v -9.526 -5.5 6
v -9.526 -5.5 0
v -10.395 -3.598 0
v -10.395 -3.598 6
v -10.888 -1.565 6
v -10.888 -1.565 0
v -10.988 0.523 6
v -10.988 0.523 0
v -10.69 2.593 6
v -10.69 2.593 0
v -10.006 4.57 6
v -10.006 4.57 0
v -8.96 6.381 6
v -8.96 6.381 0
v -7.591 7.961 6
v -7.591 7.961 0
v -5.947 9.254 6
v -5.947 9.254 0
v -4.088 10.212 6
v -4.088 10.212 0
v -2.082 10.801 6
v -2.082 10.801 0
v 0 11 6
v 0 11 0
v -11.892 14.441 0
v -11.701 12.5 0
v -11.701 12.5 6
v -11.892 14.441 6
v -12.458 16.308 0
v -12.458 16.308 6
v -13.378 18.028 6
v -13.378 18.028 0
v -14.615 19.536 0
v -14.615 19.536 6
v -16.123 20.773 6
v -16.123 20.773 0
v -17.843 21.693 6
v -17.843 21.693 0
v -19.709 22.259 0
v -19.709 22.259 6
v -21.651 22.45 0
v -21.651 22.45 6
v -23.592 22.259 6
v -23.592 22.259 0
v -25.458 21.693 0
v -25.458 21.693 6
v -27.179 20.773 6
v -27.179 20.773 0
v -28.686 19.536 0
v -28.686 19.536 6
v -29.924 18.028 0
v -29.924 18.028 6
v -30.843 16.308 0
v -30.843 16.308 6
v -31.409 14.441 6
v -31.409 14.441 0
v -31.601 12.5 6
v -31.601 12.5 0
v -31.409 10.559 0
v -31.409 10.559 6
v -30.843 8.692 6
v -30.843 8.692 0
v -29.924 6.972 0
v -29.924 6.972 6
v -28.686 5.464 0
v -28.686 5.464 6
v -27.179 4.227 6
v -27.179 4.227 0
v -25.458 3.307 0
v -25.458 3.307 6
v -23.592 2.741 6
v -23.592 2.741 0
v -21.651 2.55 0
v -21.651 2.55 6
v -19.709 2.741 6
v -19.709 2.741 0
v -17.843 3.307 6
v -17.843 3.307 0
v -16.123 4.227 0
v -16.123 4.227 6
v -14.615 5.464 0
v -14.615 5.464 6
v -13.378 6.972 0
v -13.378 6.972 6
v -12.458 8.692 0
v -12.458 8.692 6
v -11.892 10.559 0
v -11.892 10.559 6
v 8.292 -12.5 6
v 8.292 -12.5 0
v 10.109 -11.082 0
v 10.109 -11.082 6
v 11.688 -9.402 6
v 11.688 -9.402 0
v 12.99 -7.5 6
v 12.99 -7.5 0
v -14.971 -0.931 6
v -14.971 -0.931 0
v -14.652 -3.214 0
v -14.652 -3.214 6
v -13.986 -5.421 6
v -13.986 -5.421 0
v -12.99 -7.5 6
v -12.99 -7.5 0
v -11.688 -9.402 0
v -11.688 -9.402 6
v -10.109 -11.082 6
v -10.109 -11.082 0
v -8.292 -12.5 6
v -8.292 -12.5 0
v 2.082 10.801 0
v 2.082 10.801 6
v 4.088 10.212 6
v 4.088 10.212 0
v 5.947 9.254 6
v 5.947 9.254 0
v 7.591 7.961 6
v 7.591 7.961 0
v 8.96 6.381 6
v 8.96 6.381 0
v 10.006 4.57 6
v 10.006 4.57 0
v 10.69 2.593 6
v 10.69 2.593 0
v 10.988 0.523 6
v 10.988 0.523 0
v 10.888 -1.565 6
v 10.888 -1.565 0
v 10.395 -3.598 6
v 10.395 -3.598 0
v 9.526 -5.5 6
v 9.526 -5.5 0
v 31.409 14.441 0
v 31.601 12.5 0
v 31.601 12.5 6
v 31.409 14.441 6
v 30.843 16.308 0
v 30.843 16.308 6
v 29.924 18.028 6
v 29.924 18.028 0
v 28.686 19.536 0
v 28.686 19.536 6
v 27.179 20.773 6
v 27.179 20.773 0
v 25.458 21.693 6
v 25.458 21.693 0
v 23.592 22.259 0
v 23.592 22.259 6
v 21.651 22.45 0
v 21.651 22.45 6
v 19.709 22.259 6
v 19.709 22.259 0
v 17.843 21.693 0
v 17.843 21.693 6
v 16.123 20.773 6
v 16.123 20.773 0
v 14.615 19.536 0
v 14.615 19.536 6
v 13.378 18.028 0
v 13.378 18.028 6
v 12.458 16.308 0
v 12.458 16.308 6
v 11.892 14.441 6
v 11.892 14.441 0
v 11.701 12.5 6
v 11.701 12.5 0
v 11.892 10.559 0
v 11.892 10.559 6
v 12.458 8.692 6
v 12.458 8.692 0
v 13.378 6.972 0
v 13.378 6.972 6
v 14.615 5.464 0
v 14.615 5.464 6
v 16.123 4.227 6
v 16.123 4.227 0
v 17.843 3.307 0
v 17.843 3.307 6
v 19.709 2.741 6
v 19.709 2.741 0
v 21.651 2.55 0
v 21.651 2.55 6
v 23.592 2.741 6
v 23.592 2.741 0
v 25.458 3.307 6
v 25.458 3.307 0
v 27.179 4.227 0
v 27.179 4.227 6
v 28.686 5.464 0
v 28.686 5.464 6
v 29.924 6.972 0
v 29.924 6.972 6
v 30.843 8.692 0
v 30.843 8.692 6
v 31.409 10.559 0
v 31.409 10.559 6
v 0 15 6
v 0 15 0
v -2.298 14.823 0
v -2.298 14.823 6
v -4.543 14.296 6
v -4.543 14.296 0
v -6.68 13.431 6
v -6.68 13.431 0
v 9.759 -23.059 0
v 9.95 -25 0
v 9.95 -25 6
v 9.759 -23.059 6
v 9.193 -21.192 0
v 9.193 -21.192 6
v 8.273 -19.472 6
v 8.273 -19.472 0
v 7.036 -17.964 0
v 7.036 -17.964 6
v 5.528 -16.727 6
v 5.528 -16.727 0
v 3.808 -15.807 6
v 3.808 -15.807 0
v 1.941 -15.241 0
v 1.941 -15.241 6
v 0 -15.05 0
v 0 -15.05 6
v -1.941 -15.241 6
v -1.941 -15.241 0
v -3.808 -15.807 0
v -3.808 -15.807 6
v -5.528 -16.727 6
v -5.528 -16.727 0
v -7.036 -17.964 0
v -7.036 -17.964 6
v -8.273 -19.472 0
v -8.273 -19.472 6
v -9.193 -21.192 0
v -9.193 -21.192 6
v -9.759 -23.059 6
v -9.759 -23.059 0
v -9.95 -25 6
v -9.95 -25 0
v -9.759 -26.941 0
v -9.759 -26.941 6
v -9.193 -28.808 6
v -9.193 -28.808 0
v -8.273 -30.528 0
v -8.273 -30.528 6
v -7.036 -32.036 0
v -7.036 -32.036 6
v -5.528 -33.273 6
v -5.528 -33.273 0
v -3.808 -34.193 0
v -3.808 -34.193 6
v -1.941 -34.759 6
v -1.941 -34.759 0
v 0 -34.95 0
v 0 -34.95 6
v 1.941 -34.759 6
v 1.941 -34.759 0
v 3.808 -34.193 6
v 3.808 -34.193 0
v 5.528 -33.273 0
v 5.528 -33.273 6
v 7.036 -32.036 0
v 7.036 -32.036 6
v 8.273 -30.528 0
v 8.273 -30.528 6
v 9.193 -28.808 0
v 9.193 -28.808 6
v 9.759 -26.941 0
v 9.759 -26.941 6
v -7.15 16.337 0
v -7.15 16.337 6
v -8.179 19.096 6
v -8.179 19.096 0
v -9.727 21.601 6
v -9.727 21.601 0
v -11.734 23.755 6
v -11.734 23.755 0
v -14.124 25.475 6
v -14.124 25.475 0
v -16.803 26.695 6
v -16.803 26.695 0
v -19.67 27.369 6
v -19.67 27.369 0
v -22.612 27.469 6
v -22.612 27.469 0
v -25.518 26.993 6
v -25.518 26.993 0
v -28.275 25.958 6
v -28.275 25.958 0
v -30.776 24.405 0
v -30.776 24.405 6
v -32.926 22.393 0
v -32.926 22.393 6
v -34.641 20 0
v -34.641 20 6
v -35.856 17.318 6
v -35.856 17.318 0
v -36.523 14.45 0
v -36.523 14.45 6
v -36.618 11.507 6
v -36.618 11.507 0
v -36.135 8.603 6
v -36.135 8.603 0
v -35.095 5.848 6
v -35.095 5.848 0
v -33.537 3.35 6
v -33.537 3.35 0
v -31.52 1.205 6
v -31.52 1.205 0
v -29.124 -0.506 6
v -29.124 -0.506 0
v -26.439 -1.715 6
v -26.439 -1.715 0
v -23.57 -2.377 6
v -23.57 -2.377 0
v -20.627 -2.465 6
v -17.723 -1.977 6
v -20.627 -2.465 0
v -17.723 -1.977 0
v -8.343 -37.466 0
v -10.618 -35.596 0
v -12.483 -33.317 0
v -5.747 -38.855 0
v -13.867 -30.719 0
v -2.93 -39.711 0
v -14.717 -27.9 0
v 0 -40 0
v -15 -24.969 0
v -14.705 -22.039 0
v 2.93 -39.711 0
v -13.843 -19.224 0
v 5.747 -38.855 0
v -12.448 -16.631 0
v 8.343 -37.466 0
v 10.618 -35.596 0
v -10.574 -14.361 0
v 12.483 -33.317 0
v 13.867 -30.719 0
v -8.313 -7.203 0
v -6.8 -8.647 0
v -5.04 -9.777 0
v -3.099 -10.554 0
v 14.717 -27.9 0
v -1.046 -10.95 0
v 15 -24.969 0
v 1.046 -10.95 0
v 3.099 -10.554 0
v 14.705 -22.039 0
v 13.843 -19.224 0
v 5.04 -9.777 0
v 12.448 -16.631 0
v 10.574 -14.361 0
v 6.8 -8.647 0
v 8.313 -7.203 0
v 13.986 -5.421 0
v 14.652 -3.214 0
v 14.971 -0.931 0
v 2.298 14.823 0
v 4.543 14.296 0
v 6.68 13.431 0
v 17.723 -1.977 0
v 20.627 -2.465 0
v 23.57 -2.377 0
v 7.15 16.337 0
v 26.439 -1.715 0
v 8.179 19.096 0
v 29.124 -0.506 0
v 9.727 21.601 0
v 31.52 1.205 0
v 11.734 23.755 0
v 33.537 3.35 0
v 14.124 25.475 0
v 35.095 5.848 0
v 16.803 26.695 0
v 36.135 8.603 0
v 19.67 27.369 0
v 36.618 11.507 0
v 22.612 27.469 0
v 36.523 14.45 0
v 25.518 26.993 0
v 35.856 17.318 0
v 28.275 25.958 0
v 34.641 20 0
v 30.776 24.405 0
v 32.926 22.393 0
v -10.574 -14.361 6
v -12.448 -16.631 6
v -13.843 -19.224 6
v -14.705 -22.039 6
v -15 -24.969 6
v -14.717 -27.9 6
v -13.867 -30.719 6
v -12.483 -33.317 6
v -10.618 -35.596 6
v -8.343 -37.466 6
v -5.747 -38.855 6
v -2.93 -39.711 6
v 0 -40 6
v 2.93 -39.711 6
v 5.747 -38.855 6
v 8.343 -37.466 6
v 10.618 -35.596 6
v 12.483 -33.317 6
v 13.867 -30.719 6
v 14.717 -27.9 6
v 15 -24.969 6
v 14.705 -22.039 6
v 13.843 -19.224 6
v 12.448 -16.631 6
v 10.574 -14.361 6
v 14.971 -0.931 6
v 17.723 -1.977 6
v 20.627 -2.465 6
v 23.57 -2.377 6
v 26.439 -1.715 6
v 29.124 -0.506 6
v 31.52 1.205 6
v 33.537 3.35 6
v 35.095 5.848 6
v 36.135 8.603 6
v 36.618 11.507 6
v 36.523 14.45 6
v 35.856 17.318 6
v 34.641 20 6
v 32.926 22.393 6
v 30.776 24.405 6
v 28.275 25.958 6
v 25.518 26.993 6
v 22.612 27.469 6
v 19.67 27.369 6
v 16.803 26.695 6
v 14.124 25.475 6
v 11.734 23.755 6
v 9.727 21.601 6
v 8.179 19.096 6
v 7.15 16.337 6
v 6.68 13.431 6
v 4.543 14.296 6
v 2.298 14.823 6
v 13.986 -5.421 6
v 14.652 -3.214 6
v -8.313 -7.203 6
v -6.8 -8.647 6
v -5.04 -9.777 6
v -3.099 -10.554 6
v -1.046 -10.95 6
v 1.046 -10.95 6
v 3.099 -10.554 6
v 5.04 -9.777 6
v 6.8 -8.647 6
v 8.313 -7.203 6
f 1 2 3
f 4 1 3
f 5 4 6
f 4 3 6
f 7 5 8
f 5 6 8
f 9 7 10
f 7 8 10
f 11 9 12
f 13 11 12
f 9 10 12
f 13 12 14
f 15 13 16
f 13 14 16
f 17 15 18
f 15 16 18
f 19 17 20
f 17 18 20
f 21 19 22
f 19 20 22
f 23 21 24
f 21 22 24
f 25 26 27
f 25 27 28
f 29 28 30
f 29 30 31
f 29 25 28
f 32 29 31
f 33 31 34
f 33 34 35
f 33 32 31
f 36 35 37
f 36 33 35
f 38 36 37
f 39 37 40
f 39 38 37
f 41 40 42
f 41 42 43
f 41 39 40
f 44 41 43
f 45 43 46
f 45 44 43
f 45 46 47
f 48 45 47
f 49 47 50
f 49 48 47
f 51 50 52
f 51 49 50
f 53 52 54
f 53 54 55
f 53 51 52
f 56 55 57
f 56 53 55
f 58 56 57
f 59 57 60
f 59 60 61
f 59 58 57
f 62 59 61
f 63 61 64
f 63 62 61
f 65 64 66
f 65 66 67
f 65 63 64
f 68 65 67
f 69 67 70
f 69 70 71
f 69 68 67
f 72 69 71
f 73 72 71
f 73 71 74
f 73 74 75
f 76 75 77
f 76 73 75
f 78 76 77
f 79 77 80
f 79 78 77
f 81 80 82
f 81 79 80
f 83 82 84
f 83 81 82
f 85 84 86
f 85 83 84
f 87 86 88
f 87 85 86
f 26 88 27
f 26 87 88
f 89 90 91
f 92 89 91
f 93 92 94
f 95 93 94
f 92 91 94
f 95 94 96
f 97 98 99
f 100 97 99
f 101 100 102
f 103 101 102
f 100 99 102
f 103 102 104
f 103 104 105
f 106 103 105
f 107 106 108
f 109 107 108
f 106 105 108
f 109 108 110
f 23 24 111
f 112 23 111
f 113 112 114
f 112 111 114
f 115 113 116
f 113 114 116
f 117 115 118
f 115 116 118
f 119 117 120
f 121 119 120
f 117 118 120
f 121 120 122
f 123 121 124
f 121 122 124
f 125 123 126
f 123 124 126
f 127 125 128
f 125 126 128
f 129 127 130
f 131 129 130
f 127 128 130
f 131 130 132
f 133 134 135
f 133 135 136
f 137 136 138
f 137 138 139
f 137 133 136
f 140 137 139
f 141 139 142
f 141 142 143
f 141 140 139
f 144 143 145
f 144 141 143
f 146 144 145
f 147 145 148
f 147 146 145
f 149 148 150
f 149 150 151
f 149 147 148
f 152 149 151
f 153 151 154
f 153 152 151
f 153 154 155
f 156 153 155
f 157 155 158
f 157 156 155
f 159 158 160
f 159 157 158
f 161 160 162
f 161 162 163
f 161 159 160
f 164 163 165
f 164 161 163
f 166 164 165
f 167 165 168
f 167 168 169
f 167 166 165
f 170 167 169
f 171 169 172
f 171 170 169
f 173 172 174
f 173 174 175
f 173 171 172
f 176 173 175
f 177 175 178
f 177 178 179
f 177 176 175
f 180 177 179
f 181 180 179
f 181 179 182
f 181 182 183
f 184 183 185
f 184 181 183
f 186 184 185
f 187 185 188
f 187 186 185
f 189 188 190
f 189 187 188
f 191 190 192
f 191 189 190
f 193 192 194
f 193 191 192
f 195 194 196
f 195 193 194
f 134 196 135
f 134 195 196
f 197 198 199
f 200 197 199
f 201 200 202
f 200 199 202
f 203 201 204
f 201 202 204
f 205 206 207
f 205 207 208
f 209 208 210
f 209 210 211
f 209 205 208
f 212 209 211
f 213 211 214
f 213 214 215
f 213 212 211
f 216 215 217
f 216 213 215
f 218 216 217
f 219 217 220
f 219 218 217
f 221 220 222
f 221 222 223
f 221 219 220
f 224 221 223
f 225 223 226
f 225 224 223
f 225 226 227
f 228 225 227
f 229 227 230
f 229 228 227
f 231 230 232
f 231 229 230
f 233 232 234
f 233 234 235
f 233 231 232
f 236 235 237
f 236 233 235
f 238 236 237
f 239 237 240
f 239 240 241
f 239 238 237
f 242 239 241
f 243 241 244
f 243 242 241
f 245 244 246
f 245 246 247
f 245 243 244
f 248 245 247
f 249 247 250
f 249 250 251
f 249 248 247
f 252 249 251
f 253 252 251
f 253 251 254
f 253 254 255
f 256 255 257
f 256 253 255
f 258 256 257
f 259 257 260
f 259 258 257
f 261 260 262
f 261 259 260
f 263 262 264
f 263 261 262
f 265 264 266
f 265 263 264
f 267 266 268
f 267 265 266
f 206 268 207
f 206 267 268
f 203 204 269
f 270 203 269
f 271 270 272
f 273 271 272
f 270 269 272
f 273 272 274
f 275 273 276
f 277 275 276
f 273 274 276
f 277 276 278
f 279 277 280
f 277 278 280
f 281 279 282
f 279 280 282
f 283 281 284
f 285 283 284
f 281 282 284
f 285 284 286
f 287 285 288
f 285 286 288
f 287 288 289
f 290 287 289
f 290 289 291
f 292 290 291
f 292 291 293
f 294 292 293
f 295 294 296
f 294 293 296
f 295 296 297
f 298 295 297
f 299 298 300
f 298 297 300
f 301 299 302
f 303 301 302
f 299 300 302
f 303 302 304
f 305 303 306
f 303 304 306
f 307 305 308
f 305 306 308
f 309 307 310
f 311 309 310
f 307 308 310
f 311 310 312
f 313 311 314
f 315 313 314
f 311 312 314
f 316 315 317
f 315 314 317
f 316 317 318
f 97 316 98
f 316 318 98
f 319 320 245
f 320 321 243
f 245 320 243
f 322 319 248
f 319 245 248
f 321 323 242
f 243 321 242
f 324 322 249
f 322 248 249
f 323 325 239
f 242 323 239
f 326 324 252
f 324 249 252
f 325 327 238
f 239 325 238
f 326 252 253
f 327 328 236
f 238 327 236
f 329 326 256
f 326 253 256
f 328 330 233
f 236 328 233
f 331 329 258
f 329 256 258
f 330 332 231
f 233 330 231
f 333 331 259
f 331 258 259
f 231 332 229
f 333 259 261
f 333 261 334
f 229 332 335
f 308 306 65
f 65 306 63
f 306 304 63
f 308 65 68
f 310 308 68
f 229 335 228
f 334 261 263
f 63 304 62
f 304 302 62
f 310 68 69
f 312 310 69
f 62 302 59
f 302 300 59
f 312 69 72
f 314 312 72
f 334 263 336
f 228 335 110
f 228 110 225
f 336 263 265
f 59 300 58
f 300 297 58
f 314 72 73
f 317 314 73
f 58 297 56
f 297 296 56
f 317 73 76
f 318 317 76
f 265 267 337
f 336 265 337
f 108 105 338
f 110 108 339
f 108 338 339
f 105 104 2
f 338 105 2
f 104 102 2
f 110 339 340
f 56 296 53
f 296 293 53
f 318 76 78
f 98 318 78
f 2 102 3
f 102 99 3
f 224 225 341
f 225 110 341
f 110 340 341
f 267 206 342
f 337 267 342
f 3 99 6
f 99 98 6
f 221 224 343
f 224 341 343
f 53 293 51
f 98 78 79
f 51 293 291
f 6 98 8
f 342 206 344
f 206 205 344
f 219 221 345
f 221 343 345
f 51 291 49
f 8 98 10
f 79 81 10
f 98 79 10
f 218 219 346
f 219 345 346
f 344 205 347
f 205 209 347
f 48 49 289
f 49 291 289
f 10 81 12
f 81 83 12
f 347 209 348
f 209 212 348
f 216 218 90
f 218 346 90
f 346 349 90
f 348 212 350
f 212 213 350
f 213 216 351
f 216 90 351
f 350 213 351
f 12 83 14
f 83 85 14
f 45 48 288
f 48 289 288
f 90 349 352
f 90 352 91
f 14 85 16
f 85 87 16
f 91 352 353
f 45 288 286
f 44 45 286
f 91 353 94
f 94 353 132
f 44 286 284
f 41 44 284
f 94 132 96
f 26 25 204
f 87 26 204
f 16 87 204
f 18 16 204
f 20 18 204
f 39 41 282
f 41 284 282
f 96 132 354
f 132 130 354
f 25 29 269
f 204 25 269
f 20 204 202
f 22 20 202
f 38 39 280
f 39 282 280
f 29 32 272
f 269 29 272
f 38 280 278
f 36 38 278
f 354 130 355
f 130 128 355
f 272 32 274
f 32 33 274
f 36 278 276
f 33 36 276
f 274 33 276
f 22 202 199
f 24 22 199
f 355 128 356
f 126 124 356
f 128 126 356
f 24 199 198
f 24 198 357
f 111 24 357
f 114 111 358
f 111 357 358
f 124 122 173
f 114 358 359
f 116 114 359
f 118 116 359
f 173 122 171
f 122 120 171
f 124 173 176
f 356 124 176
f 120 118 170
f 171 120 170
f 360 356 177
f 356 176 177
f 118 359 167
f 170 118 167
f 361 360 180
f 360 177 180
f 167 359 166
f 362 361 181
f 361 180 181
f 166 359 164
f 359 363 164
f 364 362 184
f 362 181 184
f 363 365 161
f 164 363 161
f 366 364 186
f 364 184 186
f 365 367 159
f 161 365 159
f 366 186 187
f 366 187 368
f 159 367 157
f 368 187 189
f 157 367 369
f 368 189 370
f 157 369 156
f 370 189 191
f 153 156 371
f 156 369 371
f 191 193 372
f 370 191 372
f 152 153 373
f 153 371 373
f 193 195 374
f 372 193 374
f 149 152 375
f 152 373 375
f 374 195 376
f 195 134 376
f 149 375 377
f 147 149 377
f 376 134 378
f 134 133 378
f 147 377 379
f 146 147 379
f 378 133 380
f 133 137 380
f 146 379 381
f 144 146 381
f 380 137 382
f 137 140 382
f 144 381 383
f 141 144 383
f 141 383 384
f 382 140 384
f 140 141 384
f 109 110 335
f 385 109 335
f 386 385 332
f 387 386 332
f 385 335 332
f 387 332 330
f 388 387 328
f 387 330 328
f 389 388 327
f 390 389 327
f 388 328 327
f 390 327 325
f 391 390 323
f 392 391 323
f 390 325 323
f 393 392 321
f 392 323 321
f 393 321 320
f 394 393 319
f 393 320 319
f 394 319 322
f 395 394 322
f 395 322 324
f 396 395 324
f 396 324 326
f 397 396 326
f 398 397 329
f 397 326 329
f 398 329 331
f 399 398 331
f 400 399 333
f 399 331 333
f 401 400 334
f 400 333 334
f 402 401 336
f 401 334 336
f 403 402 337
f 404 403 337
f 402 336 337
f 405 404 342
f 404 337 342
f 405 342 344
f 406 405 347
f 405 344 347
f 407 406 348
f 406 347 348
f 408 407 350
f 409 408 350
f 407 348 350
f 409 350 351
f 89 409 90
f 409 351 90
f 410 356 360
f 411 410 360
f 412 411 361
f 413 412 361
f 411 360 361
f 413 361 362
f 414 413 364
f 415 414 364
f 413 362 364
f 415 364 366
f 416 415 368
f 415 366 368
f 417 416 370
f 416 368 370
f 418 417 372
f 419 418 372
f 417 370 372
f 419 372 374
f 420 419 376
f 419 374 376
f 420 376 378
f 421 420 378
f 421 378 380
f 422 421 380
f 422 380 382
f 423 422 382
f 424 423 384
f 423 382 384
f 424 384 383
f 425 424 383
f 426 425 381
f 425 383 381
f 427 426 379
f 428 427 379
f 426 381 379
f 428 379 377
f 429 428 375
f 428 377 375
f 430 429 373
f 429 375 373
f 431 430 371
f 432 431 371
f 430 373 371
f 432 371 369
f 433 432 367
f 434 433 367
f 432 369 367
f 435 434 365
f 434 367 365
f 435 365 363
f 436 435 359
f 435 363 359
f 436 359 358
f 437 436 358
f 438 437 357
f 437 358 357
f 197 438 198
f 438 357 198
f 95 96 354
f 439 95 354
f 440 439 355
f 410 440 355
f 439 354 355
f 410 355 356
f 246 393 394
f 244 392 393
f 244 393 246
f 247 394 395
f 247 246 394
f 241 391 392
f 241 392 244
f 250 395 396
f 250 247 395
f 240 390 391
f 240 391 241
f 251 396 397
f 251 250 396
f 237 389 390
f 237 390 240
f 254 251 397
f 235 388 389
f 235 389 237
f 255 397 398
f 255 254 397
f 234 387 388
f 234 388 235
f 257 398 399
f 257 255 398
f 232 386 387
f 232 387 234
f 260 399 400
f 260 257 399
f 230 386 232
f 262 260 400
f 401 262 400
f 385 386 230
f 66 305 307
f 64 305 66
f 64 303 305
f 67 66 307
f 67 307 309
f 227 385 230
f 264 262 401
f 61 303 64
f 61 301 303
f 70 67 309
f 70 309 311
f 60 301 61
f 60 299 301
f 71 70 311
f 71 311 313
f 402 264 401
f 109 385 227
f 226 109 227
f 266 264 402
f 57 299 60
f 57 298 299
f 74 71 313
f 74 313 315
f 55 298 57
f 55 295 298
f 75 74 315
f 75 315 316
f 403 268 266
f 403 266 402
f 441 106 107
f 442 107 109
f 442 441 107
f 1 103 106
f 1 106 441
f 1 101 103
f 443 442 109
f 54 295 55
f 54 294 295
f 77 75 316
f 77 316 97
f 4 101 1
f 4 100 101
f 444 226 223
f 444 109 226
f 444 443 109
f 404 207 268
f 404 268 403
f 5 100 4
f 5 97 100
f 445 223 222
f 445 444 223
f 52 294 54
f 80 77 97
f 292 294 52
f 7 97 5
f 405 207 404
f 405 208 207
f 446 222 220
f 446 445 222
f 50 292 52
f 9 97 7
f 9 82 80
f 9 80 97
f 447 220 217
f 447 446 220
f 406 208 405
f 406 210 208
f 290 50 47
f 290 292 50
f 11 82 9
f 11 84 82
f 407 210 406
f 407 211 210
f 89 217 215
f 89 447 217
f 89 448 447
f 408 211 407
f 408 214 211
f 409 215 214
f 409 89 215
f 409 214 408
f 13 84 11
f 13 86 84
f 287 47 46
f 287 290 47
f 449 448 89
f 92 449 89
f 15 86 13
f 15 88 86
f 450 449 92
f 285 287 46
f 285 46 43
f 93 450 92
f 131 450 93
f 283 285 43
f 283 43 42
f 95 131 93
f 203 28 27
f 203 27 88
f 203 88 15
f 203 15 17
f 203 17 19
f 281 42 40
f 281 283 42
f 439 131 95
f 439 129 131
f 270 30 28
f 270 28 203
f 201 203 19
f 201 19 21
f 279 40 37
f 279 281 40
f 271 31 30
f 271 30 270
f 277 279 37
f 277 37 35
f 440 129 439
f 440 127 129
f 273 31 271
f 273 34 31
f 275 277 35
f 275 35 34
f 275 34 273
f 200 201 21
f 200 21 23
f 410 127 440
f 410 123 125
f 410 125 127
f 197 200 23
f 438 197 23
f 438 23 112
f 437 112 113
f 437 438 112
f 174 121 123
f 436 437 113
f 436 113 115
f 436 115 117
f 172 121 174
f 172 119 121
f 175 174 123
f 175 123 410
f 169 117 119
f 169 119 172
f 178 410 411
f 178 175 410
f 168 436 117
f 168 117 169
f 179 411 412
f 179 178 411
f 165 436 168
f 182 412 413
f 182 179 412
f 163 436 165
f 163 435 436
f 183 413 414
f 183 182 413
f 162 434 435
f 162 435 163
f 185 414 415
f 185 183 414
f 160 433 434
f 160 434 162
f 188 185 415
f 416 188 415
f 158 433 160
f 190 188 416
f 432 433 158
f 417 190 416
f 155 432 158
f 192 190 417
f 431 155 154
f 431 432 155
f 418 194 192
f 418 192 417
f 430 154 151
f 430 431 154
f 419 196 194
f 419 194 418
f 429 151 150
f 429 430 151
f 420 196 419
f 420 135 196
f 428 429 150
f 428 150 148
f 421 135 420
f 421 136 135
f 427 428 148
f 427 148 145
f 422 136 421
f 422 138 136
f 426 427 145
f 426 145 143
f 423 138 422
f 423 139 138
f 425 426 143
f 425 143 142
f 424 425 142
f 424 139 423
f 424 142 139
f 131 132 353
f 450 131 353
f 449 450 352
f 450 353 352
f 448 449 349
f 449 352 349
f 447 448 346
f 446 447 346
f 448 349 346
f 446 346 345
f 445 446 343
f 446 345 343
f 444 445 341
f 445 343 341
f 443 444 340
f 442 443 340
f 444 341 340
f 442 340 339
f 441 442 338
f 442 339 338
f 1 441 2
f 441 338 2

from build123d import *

# Parameters (mm, degrees)
F0_R     = 9.95
F1_DEPTH = 6


with BuildPart() as f1:
    # F0 (on Top) → F1 (new body)
    with BuildSketch(Plane.XY):
        with BuildLine():
            ThreePointArc((-12.990381, -7.5), (-10.930703, -10.272279), (-8.291562, -12.5))
            ThreePointArc((-8.291562, -12.5), (0, -40), (8.291562, -12.5))
            ThreePointArc((8.291562, -12.5), (10.930703, -10.272279), (12.990381, -7.5))
            ThreePointArc((12.990381, -7.5), (14.361407, -4.330127), (14.971099, -0.930703))
            ThreePointArc((14.971099, -0.930703), (34.641016, 20), (6.679537, 13.430703))
            ThreePointArc((6.679537, 13.430703), (3.430703, 14.602406), (0, 15))
            ThreePointArc((0, 15), (-3.430703, 14.602406), (-6.679537, 13.430703))
            ThreePointArc((-6.679537, 13.430703), (-34.641016, 20), (-14.971099, -0.930703))
            ThreePointArc((-14.971099, -0.930703), (-14.361407, -4.330127), (-12.990381, -7.5))
        make_face()
        with Locations((0, -25)):
            Circle(F0_R, mode=Mode.SUBTRACT)
        with BuildLine():
            ThreePointArc((9.526279, -5.5), (0, -11), (-9.526279, -5.5))
            ThreePointArc((-9.526279, -5.5), (-9.526279, 5.5), (0, 11))
            ThreePointArc((0, 11), (9.526279, 5.5), (9.526279, -5.5))
        make_face(mode=Mode.SUBTRACT)
        with Locations((-21.650635, 12.5)):
            Circle(F0_R, mode=Mode.SUBTRACT)
        with Locations((21.650635, 12.5)):
            Circle(F0_R, mode=Mode.SUBTRACT)
    extrude(amount=F1_DEPTH)


solid = f1.part
